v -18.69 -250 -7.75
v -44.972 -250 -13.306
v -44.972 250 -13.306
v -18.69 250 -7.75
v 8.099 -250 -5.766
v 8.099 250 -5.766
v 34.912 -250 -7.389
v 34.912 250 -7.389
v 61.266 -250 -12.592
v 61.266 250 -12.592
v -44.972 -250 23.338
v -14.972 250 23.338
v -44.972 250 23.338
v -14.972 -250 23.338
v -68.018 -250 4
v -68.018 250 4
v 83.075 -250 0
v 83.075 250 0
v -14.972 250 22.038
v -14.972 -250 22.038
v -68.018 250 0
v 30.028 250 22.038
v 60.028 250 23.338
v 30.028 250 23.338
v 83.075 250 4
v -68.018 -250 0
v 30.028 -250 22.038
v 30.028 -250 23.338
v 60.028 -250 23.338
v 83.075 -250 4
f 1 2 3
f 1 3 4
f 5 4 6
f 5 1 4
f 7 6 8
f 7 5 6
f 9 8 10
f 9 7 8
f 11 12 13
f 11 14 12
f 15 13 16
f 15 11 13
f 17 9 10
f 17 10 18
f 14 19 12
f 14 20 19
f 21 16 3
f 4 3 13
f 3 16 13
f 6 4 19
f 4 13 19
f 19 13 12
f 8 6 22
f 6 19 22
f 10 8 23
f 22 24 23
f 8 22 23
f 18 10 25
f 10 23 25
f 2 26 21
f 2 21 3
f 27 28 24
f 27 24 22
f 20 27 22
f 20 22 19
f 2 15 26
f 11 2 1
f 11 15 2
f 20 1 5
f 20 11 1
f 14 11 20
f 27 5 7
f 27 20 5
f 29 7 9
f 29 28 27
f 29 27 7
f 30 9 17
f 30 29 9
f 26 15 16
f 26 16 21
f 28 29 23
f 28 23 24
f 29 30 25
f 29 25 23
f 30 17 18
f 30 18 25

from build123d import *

# Parameters (mm, degrees)
F1_DEPTH = 250


with BuildPart() as f1:
    # F0 (on Front) → F1 (new body, symmetric)
    with BuildSketch(Plane.XZ):
        with BuildLine():
            Line((-44.971709, 23.338451), (-68.018377, 4))
            Line((-68.018377, 4), (-68.018377, 0))
            Line((-68.018377, 0), (-44.971709, -13.306))
            ThreePointArc((-44.971709, -13.306), (8.098756, -5.765582), (61.265842, -12.5915))
            Line((61.265842, -12.5915), (83.074959, 0))
            Line((83.074959, 0), (83.074959, 4))
            Line((83.074959, 4), (60.028291, 23.338451))
            Line((60.028291, 23.338451), (30.028291, 23.338451))
            Line((30.028291, 23.338451), (30.028291, 22.038451))
            Line((30.028291, 22.038451), (-14.971709, 22.038451))
            Line((-14.971709, 22.038451), (-14.971709, 23.338451))
            Line((-14.971709, 23.338451), (-44.971709, 23.338451))
        make_face()
    extrude(amount=F1_DEPTH, both=True)


solid = f1.part
